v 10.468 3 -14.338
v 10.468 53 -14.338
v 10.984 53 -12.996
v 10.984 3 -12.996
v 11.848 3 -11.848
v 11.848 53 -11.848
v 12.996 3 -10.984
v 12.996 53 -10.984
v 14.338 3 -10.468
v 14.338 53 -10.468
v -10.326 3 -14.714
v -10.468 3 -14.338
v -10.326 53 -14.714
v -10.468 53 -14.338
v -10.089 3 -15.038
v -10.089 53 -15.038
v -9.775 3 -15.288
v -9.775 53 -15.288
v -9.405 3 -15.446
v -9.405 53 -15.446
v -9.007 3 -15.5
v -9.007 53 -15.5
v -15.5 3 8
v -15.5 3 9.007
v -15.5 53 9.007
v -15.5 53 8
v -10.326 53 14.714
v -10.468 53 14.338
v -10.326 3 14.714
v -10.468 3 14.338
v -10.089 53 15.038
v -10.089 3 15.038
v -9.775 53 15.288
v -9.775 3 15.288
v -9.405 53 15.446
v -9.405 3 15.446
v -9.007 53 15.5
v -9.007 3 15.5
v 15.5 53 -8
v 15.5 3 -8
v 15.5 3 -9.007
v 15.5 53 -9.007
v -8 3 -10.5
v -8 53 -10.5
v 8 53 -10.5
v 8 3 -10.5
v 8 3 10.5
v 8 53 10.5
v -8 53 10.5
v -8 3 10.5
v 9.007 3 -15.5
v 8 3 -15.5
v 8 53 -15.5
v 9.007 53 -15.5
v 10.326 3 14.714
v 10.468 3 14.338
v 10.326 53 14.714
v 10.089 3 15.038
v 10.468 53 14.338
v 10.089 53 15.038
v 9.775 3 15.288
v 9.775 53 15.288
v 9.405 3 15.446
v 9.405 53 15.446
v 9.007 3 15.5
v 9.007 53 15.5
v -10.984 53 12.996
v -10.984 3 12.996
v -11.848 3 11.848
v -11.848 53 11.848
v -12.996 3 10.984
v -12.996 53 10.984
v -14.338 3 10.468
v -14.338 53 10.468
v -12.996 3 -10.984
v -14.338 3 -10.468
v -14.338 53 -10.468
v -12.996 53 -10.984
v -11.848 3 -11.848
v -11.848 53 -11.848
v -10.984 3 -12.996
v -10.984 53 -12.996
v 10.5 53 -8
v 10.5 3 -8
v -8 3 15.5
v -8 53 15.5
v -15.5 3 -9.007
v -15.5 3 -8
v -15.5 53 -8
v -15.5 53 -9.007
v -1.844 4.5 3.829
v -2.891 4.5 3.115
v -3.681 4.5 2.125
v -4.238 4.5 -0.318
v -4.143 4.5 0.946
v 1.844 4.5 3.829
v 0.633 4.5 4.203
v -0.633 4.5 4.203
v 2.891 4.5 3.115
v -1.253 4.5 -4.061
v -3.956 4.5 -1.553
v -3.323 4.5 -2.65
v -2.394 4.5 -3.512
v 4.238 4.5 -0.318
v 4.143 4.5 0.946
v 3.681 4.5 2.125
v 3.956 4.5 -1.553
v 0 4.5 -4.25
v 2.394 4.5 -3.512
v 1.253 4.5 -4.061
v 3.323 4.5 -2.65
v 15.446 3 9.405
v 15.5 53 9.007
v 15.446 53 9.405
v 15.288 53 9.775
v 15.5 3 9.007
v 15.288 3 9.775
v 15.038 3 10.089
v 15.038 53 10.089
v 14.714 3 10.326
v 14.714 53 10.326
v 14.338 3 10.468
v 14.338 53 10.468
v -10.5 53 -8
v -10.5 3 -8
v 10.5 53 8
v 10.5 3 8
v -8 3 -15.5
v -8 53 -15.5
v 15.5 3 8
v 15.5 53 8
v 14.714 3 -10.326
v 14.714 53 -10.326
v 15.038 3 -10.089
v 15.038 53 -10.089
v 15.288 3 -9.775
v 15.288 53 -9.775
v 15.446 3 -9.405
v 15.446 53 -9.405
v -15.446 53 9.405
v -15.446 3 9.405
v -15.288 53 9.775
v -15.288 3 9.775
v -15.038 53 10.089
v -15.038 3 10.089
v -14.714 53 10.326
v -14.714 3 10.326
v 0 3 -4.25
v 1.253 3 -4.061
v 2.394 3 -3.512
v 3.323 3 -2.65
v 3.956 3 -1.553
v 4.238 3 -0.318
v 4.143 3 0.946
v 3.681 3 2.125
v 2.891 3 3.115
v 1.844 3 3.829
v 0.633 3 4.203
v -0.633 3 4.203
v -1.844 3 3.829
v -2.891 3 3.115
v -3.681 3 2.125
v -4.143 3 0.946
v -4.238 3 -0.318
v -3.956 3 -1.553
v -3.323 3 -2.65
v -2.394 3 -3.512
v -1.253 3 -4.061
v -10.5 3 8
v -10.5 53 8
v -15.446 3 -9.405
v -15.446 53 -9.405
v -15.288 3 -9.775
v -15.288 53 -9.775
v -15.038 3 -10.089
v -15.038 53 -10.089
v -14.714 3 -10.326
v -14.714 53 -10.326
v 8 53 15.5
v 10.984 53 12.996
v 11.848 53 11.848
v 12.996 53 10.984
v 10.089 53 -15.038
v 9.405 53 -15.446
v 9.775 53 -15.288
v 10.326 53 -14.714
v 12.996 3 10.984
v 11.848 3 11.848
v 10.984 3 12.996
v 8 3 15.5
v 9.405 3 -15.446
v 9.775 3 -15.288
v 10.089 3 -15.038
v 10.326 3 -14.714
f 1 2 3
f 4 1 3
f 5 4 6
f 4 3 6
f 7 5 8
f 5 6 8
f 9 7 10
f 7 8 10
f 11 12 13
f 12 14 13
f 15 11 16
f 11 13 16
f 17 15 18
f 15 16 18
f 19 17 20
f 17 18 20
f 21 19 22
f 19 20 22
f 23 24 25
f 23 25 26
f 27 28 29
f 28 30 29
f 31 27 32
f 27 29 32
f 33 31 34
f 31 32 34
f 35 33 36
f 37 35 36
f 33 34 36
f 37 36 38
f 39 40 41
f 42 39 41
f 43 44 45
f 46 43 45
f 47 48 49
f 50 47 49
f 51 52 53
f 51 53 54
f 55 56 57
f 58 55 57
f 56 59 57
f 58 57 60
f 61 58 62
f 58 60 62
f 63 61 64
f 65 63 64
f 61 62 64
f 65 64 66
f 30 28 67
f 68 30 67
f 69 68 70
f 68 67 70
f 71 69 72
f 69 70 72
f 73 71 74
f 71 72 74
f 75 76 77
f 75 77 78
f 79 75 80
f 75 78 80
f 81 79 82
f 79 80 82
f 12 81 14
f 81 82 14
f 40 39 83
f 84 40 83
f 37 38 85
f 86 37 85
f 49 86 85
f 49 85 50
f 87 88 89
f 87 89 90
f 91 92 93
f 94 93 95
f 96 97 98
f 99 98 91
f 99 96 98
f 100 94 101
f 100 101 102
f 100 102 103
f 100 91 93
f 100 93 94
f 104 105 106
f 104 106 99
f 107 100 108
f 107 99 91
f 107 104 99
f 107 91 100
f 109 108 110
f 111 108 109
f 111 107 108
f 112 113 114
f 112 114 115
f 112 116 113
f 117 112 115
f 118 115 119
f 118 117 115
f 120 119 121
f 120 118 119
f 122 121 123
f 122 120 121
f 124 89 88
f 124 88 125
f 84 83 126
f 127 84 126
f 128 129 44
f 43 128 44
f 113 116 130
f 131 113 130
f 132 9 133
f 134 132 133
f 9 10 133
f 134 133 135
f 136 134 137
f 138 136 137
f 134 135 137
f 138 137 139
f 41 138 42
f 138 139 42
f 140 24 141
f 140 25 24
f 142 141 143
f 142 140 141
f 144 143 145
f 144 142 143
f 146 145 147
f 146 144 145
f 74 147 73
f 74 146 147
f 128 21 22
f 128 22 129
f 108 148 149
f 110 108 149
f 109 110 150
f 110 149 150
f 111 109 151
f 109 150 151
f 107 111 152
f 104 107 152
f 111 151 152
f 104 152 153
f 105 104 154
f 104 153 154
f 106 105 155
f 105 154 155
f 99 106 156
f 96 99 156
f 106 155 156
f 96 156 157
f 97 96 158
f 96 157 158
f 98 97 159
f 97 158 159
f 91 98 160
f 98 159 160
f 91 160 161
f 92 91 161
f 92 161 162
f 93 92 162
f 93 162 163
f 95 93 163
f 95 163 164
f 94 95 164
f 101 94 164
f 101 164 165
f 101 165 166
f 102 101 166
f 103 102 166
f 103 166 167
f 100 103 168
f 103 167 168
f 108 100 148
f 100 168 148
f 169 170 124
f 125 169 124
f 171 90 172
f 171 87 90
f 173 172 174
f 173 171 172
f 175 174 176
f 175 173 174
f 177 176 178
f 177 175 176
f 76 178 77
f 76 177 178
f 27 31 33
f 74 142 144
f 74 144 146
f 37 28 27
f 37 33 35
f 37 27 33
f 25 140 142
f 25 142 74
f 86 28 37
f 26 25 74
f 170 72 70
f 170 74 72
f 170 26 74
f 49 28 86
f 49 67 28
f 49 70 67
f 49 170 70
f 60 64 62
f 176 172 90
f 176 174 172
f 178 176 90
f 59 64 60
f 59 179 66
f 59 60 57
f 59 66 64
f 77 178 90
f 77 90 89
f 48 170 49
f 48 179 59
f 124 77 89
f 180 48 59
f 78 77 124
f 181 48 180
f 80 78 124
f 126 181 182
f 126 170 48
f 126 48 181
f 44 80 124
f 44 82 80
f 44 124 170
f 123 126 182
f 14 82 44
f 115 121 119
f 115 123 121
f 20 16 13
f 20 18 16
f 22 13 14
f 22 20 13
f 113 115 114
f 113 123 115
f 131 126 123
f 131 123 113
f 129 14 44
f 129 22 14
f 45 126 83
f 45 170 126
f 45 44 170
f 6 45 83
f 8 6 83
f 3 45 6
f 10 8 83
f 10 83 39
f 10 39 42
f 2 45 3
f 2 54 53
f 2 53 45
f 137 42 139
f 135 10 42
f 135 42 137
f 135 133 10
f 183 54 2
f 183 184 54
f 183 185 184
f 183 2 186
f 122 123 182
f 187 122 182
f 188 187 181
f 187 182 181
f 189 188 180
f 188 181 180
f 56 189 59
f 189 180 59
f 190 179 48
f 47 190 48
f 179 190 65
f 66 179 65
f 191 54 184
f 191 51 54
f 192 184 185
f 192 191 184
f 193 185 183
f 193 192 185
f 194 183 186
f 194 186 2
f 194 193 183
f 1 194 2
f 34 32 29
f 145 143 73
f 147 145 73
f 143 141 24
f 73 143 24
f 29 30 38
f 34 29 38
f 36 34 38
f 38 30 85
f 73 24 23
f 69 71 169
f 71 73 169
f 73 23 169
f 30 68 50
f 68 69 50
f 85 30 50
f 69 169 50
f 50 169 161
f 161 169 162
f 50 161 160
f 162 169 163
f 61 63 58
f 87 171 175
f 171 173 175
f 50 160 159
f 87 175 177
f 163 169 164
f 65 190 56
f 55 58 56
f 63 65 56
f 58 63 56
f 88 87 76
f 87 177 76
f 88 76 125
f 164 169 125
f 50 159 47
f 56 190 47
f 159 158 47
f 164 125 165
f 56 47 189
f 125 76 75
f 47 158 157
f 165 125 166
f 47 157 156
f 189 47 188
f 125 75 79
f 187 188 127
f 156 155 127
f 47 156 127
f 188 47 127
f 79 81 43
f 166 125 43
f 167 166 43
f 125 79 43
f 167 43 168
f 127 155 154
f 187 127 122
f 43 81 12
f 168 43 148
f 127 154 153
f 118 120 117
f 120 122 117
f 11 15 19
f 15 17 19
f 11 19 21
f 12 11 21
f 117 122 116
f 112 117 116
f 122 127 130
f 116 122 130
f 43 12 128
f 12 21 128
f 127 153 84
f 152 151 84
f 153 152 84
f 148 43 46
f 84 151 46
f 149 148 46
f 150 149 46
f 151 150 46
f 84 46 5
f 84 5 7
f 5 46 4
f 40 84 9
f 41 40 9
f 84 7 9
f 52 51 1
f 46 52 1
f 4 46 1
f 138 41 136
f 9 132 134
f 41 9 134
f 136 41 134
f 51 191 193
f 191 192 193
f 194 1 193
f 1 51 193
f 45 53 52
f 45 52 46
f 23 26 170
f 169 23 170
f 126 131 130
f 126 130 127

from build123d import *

# Parameters (mm, degrees)
SKETCH5_W           = 31
SKETCH5_H           = 31
BOSS_EXTRUDE2_DEPTH = 50
SKETCH6_W           = 5
SKETCH6_H           = 16
CUT_EXTRUDE1_DEPTH  = 50
CIRPATTERN1_COUNT   = 4
SKETCH7_R           = 5.164102758
CUT_EXTRUDE2_DEPTH  = 50
CIRPATTERN2_COUNT   = 4
FILLET1_R           = 1.5
SKETCH8_R           = 4.25
CUT_EXTRUDE3_DEPTH  = 1.5


with BuildPart() as part:
    # Sketch5 → Boss-Extrude2 (new body)
    with BuildSketch(Plane(origin=(0, 3, 0), x_dir=(1, 0, 0), z_dir=(0, 1, 0))):
        Rectangle(SKETCH5_W, SKETCH5_H)
    extrude(amount=BOSS_EXTRUDE2_DEPTH)

    # Sketch6 → Cut-Extrude1 (cut)
    with BuildSketch(Plane(origin=(0, 53, 0), x_dir=(1, 0, 0), z_dir=(0, 1, 0))):
        with Locations((-13, 0)):
            Rectangle(SKETCH6_W, SKETCH6_H)
    cut_extrude1 = extrude(amount=-CUT_EXTRUDE1_DEPTH, mode=Mode.SUBTRACT)

    # CirPattern1: Cut-Extrude1 ×4 about axis
    cirpattern1_axis = Axis((0, 0, 0), (0, 1, 0))
    for i in range(1, CIRPATTERN1_COUNT):
        add(cut_extrude1.rotate(cirpattern1_axis, i * 360 / CIRPATTERN1_COUNT), mode=Mode.SUBTRACT)

    # Sketch7 → Cut-Extrude2 (cut)
    with BuildSketch(Plane(origin=(0, 53, 0), x_dir=(1, 0, 0), z_dir=(0, 1, 0))):
        with Locations((-15.5, -15.5)):
            Circle(SKETCH7_R)
    cut_extrude2 = extrude(amount=-CUT_EXTRUDE2_DEPTH, mode=Mode.SUBTRACT)

    # CirPattern2: Cut-Extrude2 ×4 about axis
    cirpattern2_axis = Axis((0, 0, 0), (0, 1, 0))
    for i in range(1, CIRPATTERN2_COUNT):
        add(cut_extrude2.rotate(cirpattern2_axis, i * 360 / CIRPATTERN2_COUNT), mode=Mode.SUBTRACT)

    # Fillet1
    fillet1_edges = [part.edges().sort_by_distance(p)[0] for p in [
        (-15.5, 28, -10.335897242),
        (-10.335897242, 28, -15.5),
        (10.335897242, 28, -15.5),
        (15.5, 28, -10.335897242),
        (15.5, 28, 10.335897242),
        (10.335897242, 28, 15.5),
        (-10.335897242, 28, 15.5),
        (-15.5, 28, 10.335897242),
    ]]
    fillet(fillet1_edges, radius=FILLET1_R)

    # Sketch8 → Cut-Extrude3 (cut)
    with BuildSketch(Plane.XZ.offset(-3)):
        Circle(SKETCH8_R)
    extrude(amount=-CUT_EXTRUDE3_DEPTH, mode=Mode.SUBTRACT)


solid = part.part
